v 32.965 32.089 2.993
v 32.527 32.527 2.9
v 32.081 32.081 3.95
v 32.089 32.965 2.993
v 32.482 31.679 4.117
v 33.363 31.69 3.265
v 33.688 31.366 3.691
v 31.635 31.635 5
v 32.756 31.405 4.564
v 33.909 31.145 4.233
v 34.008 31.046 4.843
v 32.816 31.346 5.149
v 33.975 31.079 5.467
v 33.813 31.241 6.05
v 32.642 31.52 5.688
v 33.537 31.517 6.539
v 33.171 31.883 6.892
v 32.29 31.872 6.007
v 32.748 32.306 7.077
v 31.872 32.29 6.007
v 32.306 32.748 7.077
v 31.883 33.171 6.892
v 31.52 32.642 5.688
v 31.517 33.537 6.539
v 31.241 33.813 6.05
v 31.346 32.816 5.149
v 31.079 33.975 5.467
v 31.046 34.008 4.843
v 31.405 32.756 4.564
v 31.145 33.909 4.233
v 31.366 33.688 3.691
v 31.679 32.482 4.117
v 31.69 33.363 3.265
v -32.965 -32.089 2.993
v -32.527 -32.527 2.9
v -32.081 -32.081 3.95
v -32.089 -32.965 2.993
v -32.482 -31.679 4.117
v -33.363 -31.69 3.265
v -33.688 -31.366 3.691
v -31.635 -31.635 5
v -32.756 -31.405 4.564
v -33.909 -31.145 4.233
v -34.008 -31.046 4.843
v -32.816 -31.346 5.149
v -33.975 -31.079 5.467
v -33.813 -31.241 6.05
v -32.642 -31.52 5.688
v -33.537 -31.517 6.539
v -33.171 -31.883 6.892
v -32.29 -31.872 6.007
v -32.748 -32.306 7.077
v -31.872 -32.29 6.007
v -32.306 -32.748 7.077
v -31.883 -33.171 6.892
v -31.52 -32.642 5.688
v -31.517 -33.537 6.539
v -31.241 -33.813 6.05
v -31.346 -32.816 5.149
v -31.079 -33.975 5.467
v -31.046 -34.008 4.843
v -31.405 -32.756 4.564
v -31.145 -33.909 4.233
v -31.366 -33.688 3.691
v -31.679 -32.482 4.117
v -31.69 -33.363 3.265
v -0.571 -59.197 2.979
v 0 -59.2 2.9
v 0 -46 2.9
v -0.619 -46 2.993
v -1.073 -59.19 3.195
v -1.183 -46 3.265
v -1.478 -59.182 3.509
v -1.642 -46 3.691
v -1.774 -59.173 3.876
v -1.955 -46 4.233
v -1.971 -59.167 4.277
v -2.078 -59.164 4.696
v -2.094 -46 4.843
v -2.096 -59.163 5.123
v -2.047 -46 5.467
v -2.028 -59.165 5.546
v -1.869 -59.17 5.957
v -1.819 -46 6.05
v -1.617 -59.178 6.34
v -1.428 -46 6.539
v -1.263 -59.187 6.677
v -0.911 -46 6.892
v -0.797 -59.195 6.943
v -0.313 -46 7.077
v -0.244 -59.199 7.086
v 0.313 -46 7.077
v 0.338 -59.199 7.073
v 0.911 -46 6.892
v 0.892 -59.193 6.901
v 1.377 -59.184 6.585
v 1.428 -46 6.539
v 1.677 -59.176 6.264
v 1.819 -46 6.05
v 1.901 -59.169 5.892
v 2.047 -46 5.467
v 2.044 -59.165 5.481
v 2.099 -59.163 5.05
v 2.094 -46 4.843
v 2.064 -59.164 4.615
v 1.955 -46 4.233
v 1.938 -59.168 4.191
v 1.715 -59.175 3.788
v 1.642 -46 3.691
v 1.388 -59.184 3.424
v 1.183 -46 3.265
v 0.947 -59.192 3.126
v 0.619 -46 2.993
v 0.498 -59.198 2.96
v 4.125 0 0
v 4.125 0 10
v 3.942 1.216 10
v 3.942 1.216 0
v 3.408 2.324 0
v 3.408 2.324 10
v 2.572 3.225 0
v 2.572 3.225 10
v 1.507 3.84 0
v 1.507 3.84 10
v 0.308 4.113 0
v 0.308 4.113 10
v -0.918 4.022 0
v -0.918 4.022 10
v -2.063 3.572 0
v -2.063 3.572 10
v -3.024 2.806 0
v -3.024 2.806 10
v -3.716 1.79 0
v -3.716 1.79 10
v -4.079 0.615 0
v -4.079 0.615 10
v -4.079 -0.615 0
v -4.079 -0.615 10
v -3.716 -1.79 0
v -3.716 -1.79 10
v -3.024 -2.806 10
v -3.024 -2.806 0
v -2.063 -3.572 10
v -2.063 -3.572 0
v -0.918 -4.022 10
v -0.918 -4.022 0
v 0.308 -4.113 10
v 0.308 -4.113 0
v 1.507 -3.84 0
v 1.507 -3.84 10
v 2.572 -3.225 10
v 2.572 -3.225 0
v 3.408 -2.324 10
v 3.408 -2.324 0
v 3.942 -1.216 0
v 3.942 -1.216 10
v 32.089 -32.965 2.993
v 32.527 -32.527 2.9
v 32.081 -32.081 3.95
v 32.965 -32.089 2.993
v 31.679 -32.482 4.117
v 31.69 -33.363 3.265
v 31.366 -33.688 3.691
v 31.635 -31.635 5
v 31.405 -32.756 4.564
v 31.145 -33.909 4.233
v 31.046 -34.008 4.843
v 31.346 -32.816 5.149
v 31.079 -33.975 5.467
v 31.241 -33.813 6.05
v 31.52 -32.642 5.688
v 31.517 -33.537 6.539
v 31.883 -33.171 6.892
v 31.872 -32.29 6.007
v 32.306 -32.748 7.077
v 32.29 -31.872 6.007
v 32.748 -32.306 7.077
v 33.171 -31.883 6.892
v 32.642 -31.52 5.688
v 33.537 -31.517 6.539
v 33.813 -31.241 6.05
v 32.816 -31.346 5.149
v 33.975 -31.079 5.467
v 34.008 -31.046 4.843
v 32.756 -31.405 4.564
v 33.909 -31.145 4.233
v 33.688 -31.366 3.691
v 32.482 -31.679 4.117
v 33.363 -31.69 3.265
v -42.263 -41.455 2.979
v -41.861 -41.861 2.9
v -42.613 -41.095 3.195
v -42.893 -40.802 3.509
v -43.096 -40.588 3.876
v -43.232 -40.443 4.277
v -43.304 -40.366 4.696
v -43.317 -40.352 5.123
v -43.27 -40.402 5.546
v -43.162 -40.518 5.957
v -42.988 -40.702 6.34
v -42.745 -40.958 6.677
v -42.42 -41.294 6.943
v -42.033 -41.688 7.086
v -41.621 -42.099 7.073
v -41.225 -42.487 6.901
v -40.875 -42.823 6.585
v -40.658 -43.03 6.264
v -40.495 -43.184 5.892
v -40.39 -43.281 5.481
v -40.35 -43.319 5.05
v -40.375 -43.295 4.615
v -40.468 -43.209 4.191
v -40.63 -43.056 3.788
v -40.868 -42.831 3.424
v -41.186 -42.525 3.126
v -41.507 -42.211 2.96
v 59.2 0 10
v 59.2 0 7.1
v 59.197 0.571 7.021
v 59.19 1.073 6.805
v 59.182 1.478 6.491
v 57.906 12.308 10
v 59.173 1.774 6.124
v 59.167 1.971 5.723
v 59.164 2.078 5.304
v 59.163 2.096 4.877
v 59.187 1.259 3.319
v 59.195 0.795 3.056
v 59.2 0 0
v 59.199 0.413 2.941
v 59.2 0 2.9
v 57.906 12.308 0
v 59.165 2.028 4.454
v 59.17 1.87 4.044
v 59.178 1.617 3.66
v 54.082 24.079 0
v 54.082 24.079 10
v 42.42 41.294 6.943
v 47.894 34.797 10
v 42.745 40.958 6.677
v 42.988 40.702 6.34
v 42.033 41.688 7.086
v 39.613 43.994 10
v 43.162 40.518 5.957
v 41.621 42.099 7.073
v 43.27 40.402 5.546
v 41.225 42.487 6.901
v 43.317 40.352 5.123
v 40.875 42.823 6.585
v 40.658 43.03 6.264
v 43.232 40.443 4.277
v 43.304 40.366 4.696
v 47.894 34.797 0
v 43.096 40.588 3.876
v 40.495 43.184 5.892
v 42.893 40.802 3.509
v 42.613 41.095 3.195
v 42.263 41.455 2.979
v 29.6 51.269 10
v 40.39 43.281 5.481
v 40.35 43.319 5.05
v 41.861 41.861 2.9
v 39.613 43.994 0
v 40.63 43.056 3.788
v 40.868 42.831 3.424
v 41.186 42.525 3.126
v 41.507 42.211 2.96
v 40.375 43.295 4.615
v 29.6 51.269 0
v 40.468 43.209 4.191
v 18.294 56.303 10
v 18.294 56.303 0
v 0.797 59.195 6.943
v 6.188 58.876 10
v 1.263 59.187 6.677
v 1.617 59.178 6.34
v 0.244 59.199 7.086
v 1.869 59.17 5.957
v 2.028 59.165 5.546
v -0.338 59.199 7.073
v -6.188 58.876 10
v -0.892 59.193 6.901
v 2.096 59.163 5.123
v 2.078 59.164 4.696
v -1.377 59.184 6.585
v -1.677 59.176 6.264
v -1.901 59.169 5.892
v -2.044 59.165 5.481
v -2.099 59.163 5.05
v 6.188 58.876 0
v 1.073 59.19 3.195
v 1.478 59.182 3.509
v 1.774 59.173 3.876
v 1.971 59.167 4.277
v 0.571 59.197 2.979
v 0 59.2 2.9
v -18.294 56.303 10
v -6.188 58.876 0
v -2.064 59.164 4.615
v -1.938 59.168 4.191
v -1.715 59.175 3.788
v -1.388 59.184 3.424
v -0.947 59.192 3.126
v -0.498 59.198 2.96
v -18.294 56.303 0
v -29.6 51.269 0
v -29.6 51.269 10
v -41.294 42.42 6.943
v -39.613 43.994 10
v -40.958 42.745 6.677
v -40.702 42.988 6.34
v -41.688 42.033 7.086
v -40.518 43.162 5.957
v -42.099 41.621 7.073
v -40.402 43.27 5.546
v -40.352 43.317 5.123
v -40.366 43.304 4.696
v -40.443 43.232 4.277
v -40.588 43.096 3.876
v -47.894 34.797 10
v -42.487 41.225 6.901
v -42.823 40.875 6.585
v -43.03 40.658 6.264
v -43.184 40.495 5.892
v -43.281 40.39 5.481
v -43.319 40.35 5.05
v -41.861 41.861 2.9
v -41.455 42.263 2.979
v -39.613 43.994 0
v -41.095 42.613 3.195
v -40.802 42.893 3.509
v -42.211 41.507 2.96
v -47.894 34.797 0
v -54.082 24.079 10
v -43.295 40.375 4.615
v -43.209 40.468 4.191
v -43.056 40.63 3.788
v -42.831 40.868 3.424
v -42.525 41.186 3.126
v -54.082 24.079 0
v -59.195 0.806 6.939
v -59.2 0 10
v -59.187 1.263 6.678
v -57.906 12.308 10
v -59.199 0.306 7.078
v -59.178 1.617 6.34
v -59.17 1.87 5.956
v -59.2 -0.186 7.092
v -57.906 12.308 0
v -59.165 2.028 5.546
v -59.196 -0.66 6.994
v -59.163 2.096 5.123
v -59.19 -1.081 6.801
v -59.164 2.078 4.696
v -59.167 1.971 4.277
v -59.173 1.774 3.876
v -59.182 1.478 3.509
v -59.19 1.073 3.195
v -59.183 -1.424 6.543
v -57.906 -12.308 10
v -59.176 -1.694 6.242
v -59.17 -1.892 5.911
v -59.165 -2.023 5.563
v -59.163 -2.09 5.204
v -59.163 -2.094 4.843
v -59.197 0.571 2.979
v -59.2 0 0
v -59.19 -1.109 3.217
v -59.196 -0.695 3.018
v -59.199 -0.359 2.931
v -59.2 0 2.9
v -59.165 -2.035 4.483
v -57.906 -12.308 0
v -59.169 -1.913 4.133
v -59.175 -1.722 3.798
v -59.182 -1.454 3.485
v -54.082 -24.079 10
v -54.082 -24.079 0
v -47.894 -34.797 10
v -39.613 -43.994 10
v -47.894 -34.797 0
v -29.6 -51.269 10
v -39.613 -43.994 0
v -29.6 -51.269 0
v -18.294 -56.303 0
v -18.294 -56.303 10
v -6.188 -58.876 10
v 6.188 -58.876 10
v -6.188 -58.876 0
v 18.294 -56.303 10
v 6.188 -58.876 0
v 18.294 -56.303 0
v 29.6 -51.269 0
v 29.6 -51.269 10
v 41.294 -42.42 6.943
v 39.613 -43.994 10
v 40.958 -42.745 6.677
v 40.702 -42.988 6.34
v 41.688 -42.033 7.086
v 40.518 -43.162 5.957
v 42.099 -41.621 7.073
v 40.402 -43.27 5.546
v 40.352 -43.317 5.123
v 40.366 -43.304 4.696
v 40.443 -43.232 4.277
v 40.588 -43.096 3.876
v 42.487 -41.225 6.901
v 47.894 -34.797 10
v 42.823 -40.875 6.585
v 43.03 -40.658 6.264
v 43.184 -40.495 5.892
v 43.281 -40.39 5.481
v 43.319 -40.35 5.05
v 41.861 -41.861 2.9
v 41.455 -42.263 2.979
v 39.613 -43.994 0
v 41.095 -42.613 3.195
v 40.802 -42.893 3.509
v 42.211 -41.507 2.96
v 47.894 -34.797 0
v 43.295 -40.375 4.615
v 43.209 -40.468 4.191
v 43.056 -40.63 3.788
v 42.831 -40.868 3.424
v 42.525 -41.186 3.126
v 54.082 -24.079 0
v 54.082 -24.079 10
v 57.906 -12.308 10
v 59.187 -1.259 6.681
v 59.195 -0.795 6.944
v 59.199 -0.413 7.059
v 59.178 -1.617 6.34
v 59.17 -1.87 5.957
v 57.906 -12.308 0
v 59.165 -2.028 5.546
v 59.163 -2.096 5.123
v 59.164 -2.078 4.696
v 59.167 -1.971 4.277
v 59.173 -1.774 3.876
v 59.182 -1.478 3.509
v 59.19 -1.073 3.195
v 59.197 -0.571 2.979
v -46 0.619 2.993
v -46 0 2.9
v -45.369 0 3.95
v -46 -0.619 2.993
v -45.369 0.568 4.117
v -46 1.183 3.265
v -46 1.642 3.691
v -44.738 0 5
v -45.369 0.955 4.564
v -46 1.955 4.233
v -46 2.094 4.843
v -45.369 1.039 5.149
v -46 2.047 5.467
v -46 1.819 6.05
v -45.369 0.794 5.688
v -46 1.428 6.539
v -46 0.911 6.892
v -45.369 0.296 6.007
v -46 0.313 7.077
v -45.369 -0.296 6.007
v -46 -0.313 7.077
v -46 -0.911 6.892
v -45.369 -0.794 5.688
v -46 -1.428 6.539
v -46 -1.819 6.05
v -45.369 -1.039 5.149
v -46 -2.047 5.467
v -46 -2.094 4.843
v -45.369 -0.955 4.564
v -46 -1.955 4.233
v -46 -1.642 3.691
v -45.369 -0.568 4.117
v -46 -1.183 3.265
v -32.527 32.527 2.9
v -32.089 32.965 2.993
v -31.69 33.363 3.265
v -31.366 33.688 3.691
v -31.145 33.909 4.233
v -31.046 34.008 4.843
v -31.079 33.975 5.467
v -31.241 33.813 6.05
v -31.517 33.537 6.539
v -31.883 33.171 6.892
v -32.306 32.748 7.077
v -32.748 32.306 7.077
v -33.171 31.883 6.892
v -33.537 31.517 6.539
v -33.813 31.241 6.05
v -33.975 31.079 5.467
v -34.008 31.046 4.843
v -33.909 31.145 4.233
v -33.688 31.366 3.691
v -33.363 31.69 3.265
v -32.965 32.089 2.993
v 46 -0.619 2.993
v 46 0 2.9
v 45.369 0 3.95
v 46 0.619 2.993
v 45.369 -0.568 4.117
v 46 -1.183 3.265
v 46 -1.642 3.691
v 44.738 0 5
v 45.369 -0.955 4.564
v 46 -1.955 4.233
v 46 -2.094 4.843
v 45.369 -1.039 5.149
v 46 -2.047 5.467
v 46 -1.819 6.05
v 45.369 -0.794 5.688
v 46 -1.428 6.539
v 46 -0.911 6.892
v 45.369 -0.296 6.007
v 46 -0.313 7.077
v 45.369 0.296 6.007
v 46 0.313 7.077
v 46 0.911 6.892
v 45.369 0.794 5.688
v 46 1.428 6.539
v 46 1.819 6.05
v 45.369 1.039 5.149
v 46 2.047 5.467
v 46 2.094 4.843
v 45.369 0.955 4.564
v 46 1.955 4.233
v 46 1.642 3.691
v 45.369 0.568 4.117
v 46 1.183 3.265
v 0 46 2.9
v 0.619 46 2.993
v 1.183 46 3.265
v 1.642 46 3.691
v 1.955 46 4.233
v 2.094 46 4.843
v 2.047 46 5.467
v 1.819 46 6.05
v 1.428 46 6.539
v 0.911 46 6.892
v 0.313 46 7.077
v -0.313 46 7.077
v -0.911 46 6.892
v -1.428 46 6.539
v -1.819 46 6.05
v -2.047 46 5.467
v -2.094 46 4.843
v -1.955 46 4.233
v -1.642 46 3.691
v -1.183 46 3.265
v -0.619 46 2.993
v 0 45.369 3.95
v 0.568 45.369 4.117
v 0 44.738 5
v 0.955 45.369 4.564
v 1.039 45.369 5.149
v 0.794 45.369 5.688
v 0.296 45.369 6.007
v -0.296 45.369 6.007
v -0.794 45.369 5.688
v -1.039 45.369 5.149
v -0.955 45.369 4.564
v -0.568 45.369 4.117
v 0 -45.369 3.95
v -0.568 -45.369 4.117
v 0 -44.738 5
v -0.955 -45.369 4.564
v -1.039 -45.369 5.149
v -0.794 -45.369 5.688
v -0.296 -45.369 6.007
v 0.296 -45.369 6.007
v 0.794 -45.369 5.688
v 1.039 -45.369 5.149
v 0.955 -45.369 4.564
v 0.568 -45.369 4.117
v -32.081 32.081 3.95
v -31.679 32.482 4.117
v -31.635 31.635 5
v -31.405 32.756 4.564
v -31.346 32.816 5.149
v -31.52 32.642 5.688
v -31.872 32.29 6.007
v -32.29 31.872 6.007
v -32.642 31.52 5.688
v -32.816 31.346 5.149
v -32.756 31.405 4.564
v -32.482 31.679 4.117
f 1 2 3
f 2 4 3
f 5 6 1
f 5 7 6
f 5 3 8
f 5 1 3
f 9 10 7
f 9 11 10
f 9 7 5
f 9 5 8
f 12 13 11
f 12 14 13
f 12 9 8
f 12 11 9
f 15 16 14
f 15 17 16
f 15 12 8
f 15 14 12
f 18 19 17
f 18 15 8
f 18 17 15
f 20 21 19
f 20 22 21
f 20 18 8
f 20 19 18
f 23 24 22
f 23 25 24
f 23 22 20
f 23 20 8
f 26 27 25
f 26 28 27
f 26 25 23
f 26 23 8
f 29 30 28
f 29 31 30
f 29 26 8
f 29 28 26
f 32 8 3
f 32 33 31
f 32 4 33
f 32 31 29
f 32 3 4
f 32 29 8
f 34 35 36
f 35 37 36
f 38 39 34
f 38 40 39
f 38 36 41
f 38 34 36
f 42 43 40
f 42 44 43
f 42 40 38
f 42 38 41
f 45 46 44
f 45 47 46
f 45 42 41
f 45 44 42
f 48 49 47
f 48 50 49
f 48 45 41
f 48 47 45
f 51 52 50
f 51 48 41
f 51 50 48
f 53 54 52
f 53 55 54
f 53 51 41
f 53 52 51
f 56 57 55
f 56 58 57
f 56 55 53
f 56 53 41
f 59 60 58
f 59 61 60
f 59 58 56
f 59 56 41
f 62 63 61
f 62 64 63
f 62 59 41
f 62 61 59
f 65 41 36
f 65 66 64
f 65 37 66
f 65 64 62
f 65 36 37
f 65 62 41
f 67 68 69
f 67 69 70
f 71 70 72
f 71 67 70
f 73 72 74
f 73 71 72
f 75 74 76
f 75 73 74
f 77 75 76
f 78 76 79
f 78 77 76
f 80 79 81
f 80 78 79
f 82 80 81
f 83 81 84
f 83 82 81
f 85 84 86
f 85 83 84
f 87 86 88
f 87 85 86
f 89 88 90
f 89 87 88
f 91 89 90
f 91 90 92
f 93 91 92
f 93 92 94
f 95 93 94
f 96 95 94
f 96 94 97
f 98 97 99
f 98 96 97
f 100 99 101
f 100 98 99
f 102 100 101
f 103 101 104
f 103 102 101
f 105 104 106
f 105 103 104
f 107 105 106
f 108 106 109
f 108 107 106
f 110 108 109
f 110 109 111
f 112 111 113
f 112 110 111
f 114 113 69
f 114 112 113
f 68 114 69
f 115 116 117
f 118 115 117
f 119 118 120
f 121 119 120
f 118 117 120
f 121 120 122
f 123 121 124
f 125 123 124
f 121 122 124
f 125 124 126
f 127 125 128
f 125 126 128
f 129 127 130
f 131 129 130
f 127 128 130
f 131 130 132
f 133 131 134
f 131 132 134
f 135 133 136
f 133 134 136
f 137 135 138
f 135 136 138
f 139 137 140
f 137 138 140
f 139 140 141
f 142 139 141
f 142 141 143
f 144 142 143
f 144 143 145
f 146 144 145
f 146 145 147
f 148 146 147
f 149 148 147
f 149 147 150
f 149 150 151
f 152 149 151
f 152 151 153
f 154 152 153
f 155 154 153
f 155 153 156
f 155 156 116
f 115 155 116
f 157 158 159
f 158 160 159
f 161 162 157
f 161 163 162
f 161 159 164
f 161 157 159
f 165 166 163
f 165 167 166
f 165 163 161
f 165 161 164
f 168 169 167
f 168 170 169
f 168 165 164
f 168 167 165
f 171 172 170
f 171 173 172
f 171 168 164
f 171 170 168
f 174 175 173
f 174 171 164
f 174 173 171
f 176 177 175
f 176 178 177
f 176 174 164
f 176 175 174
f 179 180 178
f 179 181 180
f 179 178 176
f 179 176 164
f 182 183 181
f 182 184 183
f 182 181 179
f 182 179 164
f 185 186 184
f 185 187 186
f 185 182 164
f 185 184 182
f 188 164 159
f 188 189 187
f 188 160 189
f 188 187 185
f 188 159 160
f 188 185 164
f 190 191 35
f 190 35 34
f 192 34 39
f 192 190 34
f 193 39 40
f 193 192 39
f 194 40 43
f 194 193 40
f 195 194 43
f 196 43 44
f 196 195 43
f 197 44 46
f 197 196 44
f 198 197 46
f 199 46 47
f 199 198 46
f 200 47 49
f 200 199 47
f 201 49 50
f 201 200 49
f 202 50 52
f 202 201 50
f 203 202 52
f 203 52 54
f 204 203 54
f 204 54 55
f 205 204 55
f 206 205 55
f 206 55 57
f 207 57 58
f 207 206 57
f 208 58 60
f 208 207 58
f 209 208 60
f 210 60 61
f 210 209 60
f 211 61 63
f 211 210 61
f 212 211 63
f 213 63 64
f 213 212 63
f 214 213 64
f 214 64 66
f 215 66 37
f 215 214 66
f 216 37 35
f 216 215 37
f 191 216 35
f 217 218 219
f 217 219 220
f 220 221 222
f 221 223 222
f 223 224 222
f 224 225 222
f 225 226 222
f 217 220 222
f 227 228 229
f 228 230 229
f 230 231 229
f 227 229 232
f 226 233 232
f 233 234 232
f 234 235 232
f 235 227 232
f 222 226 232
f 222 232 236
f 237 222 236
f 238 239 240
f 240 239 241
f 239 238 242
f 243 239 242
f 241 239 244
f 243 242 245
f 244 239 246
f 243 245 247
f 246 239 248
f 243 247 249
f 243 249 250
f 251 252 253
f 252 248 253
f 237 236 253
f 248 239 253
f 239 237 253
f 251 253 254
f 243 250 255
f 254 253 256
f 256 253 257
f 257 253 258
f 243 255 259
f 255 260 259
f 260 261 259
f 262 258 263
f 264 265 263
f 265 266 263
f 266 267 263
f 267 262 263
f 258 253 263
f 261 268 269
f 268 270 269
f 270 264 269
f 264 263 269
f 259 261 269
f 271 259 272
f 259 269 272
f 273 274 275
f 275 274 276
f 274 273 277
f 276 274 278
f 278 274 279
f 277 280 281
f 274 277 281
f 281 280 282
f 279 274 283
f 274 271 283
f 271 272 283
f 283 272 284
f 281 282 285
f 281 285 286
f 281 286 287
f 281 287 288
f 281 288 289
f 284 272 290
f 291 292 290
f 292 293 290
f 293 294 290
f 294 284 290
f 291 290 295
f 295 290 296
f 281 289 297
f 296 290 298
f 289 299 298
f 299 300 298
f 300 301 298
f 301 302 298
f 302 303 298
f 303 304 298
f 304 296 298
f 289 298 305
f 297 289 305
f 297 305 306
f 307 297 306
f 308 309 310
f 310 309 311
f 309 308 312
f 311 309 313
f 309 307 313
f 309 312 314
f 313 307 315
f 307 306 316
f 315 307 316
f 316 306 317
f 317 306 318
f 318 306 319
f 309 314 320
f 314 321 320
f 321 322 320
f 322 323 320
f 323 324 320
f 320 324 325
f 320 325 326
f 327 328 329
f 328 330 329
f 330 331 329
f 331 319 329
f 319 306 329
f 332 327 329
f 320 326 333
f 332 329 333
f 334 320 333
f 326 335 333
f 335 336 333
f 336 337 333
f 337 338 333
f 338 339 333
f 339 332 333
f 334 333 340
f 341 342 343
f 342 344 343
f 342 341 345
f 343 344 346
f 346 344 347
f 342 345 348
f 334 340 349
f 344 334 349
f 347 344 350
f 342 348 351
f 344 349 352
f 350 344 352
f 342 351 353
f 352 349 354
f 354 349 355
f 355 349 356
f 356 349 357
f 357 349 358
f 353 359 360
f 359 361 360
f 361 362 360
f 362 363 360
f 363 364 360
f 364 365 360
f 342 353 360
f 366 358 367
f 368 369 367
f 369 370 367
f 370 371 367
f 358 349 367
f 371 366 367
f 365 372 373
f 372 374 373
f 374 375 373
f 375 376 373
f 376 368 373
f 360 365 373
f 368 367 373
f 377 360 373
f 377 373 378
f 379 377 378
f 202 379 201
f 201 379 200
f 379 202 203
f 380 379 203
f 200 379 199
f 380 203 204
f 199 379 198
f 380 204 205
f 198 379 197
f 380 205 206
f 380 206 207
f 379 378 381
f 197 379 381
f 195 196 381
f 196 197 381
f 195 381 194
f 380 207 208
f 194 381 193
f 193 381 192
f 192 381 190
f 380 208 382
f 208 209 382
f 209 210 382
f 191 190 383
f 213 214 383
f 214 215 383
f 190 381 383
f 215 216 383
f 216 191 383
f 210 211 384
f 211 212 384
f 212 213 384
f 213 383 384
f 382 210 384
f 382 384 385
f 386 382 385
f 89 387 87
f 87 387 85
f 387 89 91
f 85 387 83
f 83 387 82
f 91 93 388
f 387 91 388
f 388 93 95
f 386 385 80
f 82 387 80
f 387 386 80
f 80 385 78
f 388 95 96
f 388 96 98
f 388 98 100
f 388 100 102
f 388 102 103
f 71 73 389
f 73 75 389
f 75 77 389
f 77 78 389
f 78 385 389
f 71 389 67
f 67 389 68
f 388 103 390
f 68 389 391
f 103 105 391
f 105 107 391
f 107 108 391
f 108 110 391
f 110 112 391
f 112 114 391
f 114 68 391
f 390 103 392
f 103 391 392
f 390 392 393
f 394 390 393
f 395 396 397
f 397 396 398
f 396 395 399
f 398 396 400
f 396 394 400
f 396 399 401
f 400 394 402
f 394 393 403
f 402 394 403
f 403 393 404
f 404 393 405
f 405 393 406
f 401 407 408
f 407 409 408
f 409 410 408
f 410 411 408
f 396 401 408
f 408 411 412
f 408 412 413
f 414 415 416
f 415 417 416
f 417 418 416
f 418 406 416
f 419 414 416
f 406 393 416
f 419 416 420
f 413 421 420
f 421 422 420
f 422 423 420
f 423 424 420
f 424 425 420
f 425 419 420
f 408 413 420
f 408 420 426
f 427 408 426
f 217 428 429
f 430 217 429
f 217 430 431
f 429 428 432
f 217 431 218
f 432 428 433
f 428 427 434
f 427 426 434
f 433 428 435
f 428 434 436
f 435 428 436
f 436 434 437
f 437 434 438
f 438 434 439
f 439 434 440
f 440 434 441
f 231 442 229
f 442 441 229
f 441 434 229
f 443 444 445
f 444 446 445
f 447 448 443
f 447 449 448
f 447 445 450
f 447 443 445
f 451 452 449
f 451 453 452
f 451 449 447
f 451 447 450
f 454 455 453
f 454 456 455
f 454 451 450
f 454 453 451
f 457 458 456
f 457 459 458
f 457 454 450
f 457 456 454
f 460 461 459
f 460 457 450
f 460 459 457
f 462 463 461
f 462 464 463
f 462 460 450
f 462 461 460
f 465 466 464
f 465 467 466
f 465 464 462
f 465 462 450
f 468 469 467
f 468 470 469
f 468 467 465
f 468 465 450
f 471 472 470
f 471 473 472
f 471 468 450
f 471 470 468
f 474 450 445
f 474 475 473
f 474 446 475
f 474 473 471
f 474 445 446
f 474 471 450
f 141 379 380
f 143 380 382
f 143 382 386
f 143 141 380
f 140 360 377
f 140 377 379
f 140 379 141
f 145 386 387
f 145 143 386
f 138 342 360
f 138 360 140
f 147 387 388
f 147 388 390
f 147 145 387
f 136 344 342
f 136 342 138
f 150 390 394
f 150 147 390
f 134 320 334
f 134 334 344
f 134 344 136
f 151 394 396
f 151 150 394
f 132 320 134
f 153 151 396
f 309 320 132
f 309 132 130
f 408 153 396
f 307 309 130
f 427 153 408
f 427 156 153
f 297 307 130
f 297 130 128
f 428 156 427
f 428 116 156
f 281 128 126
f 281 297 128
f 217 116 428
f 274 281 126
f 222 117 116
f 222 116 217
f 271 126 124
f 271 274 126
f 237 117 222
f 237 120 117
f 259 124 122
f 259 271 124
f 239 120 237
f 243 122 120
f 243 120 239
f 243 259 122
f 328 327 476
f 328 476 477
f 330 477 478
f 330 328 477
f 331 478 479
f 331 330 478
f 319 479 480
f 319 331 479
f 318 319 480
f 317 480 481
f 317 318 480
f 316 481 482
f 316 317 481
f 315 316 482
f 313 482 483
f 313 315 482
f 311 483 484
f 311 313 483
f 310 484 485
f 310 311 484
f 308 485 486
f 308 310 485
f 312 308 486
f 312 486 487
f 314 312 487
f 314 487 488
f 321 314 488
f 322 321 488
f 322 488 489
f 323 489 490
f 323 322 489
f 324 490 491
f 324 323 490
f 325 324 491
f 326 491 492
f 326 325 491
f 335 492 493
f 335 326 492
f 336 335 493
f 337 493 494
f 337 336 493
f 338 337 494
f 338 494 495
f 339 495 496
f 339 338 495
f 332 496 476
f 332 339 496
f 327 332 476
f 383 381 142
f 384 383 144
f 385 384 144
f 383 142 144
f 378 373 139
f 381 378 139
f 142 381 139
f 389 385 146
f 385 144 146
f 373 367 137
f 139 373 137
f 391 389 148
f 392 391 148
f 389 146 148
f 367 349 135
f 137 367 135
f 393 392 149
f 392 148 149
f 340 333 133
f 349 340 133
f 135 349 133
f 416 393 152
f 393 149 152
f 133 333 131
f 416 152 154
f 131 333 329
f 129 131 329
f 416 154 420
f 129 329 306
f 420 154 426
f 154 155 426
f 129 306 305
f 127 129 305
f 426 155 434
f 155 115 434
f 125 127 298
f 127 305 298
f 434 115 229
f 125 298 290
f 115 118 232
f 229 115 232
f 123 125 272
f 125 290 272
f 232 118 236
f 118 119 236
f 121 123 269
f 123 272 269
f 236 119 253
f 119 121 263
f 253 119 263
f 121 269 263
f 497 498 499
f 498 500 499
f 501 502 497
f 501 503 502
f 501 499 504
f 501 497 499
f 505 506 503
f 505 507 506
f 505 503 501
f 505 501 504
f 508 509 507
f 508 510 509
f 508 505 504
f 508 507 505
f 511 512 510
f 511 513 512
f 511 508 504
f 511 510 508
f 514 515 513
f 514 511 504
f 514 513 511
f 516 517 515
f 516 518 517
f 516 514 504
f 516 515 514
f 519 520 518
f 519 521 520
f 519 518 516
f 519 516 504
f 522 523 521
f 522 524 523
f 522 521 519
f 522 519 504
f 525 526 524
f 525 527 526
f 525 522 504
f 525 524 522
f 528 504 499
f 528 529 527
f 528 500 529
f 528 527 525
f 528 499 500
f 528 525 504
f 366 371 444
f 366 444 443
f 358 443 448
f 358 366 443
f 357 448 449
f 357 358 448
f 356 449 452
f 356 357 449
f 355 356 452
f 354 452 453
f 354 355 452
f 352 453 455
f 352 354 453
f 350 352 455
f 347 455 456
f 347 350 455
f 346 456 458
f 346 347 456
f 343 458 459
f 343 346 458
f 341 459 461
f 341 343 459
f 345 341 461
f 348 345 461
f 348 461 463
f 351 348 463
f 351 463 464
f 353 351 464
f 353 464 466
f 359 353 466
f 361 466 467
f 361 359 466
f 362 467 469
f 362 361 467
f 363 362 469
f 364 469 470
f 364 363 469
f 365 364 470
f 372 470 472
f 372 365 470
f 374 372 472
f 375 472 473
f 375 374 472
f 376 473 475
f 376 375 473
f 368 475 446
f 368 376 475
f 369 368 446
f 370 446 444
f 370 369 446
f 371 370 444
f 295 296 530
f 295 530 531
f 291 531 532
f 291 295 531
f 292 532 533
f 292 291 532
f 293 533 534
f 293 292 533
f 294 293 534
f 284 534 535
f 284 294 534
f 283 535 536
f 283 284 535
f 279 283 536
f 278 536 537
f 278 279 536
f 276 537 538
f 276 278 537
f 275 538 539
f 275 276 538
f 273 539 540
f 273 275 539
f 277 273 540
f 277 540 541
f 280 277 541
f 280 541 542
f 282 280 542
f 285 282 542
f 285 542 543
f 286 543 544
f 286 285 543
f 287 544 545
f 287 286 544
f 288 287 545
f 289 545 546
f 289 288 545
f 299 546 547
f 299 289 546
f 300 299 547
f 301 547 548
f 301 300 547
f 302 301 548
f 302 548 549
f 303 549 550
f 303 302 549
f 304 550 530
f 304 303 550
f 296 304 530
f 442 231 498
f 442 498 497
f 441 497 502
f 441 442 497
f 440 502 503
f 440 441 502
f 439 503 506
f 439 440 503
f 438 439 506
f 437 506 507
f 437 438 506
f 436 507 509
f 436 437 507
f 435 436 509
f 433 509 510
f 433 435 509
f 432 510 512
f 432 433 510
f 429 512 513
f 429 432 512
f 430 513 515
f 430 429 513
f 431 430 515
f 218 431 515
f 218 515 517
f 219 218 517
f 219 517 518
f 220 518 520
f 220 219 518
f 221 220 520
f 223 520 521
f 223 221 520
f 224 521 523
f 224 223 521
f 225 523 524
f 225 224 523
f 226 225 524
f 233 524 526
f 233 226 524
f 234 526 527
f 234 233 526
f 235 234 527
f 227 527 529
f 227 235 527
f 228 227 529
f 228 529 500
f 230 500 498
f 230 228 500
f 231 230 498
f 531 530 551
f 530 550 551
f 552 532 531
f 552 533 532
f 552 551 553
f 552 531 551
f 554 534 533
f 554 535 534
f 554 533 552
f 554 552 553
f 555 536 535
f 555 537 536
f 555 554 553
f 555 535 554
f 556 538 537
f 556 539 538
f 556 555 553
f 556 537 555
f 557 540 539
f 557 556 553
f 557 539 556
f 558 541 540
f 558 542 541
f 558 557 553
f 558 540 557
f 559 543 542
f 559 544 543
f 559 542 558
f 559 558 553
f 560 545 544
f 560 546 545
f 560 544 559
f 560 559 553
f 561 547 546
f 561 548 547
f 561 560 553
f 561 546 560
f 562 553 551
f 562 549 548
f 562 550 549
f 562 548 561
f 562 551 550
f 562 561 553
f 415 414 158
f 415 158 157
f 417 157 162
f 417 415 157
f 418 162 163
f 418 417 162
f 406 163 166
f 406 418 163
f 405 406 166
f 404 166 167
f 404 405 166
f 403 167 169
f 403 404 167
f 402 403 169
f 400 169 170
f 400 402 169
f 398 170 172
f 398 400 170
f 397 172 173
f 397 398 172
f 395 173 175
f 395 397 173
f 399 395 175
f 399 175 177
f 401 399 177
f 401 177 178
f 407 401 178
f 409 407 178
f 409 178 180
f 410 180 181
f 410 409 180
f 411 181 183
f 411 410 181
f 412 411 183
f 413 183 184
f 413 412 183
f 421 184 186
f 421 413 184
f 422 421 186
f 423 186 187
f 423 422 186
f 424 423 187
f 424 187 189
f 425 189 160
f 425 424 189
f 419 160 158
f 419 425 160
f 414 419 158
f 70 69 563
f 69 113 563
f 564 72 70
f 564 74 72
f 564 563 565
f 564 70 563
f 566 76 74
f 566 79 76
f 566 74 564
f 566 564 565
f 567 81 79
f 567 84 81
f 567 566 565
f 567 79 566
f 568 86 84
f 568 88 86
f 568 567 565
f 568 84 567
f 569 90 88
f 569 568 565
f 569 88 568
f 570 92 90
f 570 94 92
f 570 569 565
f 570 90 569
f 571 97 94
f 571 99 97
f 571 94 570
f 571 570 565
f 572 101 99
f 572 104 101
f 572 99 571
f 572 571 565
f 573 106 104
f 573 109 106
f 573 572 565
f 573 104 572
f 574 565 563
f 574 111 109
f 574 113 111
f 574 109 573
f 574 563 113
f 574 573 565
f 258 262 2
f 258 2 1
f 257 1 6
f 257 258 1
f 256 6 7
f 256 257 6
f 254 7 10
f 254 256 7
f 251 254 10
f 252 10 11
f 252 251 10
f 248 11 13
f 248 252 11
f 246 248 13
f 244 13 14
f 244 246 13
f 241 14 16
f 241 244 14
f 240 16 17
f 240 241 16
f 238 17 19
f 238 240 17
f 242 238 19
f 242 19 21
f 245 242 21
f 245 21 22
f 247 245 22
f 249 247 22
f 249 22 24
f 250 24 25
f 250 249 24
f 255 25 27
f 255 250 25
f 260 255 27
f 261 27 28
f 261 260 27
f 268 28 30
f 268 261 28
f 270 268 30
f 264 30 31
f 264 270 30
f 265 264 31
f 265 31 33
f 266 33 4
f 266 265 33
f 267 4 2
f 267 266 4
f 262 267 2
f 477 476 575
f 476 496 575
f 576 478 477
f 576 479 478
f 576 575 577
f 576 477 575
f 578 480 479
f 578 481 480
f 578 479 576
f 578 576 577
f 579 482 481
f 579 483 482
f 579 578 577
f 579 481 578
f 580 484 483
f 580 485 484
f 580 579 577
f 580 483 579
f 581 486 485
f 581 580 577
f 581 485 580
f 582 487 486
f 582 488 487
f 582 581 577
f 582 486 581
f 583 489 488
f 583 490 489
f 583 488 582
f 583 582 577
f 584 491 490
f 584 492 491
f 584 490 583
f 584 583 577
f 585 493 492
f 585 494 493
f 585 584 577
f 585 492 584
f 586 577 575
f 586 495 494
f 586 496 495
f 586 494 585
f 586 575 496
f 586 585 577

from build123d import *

# Parameters (mm, degrees)
IZIM1_R                              = 59.2
Y_KSEKLIK_EKSTR_ZYON1_DEPTH          = 10
DAIRESEL_KAPLAMA1_COUNT              = 8
M8_HELISARMAL_I_IN_Z_VANA_MATKAB_2_D = 8.25


with BuildPart() as part:
    # Çizim1 → Yükseklik-Ekstrüzyon1 (new body)
    with BuildSketch(Plane.XY):
        Circle(IZIM1_R)
    extrude(amount=Y_KSEKLIK_EKSTR_ZYON1_DEPTH)

    # Çizim10 → M4x0.7 Helisarmal İçin Dişli Delik1 (revolve, cut)
    with BuildSketch(Plane(origin=(62, 0, 5), x_dir=(0, 0, -1), z_dir=(0, 1, 0))):
        Polygon((0, 0), (0, 17.2618073), (2.1, 16), (2.1, 0), align=None)
    m4x0_7_helisarmal_in_di_li_delik1 = revolve(axis=Axis((68.35, 0, 5), (-1, 0, 0)), mode=Mode.SUBTRACT)

    # Dairesel Kaplama1: M4x0.7 Helisarmal İçin Dişli Delik1 ×8 about axis
    dairesel_kaplama1_axis = Axis((0, 0, 10), (0, 0, -1))
    for i in range(1, DAIRESEL_KAPLAMA1_COUNT):
        add(m4x0_7_helisarmal_in_di_li_delik1.rotate(dairesel_kaplama1_axis, i * 360 / DAIRESEL_KAPLAMA1_COUNT), mode=Mode.SUBTRACT)

    # M8 Helisarmal için Zıvana matkabı2 (through all)
    with Locations(Plane(origin=(0, 0, 0), x_dir=(-1, 0, 0), z_dir=(0, 0, -1))):
        with Locations((0, 0)):
            Hole(M8_HELISARMAL_I_IN_Z_VANA_MATKAB_2_D / 2)


solid = part.part
